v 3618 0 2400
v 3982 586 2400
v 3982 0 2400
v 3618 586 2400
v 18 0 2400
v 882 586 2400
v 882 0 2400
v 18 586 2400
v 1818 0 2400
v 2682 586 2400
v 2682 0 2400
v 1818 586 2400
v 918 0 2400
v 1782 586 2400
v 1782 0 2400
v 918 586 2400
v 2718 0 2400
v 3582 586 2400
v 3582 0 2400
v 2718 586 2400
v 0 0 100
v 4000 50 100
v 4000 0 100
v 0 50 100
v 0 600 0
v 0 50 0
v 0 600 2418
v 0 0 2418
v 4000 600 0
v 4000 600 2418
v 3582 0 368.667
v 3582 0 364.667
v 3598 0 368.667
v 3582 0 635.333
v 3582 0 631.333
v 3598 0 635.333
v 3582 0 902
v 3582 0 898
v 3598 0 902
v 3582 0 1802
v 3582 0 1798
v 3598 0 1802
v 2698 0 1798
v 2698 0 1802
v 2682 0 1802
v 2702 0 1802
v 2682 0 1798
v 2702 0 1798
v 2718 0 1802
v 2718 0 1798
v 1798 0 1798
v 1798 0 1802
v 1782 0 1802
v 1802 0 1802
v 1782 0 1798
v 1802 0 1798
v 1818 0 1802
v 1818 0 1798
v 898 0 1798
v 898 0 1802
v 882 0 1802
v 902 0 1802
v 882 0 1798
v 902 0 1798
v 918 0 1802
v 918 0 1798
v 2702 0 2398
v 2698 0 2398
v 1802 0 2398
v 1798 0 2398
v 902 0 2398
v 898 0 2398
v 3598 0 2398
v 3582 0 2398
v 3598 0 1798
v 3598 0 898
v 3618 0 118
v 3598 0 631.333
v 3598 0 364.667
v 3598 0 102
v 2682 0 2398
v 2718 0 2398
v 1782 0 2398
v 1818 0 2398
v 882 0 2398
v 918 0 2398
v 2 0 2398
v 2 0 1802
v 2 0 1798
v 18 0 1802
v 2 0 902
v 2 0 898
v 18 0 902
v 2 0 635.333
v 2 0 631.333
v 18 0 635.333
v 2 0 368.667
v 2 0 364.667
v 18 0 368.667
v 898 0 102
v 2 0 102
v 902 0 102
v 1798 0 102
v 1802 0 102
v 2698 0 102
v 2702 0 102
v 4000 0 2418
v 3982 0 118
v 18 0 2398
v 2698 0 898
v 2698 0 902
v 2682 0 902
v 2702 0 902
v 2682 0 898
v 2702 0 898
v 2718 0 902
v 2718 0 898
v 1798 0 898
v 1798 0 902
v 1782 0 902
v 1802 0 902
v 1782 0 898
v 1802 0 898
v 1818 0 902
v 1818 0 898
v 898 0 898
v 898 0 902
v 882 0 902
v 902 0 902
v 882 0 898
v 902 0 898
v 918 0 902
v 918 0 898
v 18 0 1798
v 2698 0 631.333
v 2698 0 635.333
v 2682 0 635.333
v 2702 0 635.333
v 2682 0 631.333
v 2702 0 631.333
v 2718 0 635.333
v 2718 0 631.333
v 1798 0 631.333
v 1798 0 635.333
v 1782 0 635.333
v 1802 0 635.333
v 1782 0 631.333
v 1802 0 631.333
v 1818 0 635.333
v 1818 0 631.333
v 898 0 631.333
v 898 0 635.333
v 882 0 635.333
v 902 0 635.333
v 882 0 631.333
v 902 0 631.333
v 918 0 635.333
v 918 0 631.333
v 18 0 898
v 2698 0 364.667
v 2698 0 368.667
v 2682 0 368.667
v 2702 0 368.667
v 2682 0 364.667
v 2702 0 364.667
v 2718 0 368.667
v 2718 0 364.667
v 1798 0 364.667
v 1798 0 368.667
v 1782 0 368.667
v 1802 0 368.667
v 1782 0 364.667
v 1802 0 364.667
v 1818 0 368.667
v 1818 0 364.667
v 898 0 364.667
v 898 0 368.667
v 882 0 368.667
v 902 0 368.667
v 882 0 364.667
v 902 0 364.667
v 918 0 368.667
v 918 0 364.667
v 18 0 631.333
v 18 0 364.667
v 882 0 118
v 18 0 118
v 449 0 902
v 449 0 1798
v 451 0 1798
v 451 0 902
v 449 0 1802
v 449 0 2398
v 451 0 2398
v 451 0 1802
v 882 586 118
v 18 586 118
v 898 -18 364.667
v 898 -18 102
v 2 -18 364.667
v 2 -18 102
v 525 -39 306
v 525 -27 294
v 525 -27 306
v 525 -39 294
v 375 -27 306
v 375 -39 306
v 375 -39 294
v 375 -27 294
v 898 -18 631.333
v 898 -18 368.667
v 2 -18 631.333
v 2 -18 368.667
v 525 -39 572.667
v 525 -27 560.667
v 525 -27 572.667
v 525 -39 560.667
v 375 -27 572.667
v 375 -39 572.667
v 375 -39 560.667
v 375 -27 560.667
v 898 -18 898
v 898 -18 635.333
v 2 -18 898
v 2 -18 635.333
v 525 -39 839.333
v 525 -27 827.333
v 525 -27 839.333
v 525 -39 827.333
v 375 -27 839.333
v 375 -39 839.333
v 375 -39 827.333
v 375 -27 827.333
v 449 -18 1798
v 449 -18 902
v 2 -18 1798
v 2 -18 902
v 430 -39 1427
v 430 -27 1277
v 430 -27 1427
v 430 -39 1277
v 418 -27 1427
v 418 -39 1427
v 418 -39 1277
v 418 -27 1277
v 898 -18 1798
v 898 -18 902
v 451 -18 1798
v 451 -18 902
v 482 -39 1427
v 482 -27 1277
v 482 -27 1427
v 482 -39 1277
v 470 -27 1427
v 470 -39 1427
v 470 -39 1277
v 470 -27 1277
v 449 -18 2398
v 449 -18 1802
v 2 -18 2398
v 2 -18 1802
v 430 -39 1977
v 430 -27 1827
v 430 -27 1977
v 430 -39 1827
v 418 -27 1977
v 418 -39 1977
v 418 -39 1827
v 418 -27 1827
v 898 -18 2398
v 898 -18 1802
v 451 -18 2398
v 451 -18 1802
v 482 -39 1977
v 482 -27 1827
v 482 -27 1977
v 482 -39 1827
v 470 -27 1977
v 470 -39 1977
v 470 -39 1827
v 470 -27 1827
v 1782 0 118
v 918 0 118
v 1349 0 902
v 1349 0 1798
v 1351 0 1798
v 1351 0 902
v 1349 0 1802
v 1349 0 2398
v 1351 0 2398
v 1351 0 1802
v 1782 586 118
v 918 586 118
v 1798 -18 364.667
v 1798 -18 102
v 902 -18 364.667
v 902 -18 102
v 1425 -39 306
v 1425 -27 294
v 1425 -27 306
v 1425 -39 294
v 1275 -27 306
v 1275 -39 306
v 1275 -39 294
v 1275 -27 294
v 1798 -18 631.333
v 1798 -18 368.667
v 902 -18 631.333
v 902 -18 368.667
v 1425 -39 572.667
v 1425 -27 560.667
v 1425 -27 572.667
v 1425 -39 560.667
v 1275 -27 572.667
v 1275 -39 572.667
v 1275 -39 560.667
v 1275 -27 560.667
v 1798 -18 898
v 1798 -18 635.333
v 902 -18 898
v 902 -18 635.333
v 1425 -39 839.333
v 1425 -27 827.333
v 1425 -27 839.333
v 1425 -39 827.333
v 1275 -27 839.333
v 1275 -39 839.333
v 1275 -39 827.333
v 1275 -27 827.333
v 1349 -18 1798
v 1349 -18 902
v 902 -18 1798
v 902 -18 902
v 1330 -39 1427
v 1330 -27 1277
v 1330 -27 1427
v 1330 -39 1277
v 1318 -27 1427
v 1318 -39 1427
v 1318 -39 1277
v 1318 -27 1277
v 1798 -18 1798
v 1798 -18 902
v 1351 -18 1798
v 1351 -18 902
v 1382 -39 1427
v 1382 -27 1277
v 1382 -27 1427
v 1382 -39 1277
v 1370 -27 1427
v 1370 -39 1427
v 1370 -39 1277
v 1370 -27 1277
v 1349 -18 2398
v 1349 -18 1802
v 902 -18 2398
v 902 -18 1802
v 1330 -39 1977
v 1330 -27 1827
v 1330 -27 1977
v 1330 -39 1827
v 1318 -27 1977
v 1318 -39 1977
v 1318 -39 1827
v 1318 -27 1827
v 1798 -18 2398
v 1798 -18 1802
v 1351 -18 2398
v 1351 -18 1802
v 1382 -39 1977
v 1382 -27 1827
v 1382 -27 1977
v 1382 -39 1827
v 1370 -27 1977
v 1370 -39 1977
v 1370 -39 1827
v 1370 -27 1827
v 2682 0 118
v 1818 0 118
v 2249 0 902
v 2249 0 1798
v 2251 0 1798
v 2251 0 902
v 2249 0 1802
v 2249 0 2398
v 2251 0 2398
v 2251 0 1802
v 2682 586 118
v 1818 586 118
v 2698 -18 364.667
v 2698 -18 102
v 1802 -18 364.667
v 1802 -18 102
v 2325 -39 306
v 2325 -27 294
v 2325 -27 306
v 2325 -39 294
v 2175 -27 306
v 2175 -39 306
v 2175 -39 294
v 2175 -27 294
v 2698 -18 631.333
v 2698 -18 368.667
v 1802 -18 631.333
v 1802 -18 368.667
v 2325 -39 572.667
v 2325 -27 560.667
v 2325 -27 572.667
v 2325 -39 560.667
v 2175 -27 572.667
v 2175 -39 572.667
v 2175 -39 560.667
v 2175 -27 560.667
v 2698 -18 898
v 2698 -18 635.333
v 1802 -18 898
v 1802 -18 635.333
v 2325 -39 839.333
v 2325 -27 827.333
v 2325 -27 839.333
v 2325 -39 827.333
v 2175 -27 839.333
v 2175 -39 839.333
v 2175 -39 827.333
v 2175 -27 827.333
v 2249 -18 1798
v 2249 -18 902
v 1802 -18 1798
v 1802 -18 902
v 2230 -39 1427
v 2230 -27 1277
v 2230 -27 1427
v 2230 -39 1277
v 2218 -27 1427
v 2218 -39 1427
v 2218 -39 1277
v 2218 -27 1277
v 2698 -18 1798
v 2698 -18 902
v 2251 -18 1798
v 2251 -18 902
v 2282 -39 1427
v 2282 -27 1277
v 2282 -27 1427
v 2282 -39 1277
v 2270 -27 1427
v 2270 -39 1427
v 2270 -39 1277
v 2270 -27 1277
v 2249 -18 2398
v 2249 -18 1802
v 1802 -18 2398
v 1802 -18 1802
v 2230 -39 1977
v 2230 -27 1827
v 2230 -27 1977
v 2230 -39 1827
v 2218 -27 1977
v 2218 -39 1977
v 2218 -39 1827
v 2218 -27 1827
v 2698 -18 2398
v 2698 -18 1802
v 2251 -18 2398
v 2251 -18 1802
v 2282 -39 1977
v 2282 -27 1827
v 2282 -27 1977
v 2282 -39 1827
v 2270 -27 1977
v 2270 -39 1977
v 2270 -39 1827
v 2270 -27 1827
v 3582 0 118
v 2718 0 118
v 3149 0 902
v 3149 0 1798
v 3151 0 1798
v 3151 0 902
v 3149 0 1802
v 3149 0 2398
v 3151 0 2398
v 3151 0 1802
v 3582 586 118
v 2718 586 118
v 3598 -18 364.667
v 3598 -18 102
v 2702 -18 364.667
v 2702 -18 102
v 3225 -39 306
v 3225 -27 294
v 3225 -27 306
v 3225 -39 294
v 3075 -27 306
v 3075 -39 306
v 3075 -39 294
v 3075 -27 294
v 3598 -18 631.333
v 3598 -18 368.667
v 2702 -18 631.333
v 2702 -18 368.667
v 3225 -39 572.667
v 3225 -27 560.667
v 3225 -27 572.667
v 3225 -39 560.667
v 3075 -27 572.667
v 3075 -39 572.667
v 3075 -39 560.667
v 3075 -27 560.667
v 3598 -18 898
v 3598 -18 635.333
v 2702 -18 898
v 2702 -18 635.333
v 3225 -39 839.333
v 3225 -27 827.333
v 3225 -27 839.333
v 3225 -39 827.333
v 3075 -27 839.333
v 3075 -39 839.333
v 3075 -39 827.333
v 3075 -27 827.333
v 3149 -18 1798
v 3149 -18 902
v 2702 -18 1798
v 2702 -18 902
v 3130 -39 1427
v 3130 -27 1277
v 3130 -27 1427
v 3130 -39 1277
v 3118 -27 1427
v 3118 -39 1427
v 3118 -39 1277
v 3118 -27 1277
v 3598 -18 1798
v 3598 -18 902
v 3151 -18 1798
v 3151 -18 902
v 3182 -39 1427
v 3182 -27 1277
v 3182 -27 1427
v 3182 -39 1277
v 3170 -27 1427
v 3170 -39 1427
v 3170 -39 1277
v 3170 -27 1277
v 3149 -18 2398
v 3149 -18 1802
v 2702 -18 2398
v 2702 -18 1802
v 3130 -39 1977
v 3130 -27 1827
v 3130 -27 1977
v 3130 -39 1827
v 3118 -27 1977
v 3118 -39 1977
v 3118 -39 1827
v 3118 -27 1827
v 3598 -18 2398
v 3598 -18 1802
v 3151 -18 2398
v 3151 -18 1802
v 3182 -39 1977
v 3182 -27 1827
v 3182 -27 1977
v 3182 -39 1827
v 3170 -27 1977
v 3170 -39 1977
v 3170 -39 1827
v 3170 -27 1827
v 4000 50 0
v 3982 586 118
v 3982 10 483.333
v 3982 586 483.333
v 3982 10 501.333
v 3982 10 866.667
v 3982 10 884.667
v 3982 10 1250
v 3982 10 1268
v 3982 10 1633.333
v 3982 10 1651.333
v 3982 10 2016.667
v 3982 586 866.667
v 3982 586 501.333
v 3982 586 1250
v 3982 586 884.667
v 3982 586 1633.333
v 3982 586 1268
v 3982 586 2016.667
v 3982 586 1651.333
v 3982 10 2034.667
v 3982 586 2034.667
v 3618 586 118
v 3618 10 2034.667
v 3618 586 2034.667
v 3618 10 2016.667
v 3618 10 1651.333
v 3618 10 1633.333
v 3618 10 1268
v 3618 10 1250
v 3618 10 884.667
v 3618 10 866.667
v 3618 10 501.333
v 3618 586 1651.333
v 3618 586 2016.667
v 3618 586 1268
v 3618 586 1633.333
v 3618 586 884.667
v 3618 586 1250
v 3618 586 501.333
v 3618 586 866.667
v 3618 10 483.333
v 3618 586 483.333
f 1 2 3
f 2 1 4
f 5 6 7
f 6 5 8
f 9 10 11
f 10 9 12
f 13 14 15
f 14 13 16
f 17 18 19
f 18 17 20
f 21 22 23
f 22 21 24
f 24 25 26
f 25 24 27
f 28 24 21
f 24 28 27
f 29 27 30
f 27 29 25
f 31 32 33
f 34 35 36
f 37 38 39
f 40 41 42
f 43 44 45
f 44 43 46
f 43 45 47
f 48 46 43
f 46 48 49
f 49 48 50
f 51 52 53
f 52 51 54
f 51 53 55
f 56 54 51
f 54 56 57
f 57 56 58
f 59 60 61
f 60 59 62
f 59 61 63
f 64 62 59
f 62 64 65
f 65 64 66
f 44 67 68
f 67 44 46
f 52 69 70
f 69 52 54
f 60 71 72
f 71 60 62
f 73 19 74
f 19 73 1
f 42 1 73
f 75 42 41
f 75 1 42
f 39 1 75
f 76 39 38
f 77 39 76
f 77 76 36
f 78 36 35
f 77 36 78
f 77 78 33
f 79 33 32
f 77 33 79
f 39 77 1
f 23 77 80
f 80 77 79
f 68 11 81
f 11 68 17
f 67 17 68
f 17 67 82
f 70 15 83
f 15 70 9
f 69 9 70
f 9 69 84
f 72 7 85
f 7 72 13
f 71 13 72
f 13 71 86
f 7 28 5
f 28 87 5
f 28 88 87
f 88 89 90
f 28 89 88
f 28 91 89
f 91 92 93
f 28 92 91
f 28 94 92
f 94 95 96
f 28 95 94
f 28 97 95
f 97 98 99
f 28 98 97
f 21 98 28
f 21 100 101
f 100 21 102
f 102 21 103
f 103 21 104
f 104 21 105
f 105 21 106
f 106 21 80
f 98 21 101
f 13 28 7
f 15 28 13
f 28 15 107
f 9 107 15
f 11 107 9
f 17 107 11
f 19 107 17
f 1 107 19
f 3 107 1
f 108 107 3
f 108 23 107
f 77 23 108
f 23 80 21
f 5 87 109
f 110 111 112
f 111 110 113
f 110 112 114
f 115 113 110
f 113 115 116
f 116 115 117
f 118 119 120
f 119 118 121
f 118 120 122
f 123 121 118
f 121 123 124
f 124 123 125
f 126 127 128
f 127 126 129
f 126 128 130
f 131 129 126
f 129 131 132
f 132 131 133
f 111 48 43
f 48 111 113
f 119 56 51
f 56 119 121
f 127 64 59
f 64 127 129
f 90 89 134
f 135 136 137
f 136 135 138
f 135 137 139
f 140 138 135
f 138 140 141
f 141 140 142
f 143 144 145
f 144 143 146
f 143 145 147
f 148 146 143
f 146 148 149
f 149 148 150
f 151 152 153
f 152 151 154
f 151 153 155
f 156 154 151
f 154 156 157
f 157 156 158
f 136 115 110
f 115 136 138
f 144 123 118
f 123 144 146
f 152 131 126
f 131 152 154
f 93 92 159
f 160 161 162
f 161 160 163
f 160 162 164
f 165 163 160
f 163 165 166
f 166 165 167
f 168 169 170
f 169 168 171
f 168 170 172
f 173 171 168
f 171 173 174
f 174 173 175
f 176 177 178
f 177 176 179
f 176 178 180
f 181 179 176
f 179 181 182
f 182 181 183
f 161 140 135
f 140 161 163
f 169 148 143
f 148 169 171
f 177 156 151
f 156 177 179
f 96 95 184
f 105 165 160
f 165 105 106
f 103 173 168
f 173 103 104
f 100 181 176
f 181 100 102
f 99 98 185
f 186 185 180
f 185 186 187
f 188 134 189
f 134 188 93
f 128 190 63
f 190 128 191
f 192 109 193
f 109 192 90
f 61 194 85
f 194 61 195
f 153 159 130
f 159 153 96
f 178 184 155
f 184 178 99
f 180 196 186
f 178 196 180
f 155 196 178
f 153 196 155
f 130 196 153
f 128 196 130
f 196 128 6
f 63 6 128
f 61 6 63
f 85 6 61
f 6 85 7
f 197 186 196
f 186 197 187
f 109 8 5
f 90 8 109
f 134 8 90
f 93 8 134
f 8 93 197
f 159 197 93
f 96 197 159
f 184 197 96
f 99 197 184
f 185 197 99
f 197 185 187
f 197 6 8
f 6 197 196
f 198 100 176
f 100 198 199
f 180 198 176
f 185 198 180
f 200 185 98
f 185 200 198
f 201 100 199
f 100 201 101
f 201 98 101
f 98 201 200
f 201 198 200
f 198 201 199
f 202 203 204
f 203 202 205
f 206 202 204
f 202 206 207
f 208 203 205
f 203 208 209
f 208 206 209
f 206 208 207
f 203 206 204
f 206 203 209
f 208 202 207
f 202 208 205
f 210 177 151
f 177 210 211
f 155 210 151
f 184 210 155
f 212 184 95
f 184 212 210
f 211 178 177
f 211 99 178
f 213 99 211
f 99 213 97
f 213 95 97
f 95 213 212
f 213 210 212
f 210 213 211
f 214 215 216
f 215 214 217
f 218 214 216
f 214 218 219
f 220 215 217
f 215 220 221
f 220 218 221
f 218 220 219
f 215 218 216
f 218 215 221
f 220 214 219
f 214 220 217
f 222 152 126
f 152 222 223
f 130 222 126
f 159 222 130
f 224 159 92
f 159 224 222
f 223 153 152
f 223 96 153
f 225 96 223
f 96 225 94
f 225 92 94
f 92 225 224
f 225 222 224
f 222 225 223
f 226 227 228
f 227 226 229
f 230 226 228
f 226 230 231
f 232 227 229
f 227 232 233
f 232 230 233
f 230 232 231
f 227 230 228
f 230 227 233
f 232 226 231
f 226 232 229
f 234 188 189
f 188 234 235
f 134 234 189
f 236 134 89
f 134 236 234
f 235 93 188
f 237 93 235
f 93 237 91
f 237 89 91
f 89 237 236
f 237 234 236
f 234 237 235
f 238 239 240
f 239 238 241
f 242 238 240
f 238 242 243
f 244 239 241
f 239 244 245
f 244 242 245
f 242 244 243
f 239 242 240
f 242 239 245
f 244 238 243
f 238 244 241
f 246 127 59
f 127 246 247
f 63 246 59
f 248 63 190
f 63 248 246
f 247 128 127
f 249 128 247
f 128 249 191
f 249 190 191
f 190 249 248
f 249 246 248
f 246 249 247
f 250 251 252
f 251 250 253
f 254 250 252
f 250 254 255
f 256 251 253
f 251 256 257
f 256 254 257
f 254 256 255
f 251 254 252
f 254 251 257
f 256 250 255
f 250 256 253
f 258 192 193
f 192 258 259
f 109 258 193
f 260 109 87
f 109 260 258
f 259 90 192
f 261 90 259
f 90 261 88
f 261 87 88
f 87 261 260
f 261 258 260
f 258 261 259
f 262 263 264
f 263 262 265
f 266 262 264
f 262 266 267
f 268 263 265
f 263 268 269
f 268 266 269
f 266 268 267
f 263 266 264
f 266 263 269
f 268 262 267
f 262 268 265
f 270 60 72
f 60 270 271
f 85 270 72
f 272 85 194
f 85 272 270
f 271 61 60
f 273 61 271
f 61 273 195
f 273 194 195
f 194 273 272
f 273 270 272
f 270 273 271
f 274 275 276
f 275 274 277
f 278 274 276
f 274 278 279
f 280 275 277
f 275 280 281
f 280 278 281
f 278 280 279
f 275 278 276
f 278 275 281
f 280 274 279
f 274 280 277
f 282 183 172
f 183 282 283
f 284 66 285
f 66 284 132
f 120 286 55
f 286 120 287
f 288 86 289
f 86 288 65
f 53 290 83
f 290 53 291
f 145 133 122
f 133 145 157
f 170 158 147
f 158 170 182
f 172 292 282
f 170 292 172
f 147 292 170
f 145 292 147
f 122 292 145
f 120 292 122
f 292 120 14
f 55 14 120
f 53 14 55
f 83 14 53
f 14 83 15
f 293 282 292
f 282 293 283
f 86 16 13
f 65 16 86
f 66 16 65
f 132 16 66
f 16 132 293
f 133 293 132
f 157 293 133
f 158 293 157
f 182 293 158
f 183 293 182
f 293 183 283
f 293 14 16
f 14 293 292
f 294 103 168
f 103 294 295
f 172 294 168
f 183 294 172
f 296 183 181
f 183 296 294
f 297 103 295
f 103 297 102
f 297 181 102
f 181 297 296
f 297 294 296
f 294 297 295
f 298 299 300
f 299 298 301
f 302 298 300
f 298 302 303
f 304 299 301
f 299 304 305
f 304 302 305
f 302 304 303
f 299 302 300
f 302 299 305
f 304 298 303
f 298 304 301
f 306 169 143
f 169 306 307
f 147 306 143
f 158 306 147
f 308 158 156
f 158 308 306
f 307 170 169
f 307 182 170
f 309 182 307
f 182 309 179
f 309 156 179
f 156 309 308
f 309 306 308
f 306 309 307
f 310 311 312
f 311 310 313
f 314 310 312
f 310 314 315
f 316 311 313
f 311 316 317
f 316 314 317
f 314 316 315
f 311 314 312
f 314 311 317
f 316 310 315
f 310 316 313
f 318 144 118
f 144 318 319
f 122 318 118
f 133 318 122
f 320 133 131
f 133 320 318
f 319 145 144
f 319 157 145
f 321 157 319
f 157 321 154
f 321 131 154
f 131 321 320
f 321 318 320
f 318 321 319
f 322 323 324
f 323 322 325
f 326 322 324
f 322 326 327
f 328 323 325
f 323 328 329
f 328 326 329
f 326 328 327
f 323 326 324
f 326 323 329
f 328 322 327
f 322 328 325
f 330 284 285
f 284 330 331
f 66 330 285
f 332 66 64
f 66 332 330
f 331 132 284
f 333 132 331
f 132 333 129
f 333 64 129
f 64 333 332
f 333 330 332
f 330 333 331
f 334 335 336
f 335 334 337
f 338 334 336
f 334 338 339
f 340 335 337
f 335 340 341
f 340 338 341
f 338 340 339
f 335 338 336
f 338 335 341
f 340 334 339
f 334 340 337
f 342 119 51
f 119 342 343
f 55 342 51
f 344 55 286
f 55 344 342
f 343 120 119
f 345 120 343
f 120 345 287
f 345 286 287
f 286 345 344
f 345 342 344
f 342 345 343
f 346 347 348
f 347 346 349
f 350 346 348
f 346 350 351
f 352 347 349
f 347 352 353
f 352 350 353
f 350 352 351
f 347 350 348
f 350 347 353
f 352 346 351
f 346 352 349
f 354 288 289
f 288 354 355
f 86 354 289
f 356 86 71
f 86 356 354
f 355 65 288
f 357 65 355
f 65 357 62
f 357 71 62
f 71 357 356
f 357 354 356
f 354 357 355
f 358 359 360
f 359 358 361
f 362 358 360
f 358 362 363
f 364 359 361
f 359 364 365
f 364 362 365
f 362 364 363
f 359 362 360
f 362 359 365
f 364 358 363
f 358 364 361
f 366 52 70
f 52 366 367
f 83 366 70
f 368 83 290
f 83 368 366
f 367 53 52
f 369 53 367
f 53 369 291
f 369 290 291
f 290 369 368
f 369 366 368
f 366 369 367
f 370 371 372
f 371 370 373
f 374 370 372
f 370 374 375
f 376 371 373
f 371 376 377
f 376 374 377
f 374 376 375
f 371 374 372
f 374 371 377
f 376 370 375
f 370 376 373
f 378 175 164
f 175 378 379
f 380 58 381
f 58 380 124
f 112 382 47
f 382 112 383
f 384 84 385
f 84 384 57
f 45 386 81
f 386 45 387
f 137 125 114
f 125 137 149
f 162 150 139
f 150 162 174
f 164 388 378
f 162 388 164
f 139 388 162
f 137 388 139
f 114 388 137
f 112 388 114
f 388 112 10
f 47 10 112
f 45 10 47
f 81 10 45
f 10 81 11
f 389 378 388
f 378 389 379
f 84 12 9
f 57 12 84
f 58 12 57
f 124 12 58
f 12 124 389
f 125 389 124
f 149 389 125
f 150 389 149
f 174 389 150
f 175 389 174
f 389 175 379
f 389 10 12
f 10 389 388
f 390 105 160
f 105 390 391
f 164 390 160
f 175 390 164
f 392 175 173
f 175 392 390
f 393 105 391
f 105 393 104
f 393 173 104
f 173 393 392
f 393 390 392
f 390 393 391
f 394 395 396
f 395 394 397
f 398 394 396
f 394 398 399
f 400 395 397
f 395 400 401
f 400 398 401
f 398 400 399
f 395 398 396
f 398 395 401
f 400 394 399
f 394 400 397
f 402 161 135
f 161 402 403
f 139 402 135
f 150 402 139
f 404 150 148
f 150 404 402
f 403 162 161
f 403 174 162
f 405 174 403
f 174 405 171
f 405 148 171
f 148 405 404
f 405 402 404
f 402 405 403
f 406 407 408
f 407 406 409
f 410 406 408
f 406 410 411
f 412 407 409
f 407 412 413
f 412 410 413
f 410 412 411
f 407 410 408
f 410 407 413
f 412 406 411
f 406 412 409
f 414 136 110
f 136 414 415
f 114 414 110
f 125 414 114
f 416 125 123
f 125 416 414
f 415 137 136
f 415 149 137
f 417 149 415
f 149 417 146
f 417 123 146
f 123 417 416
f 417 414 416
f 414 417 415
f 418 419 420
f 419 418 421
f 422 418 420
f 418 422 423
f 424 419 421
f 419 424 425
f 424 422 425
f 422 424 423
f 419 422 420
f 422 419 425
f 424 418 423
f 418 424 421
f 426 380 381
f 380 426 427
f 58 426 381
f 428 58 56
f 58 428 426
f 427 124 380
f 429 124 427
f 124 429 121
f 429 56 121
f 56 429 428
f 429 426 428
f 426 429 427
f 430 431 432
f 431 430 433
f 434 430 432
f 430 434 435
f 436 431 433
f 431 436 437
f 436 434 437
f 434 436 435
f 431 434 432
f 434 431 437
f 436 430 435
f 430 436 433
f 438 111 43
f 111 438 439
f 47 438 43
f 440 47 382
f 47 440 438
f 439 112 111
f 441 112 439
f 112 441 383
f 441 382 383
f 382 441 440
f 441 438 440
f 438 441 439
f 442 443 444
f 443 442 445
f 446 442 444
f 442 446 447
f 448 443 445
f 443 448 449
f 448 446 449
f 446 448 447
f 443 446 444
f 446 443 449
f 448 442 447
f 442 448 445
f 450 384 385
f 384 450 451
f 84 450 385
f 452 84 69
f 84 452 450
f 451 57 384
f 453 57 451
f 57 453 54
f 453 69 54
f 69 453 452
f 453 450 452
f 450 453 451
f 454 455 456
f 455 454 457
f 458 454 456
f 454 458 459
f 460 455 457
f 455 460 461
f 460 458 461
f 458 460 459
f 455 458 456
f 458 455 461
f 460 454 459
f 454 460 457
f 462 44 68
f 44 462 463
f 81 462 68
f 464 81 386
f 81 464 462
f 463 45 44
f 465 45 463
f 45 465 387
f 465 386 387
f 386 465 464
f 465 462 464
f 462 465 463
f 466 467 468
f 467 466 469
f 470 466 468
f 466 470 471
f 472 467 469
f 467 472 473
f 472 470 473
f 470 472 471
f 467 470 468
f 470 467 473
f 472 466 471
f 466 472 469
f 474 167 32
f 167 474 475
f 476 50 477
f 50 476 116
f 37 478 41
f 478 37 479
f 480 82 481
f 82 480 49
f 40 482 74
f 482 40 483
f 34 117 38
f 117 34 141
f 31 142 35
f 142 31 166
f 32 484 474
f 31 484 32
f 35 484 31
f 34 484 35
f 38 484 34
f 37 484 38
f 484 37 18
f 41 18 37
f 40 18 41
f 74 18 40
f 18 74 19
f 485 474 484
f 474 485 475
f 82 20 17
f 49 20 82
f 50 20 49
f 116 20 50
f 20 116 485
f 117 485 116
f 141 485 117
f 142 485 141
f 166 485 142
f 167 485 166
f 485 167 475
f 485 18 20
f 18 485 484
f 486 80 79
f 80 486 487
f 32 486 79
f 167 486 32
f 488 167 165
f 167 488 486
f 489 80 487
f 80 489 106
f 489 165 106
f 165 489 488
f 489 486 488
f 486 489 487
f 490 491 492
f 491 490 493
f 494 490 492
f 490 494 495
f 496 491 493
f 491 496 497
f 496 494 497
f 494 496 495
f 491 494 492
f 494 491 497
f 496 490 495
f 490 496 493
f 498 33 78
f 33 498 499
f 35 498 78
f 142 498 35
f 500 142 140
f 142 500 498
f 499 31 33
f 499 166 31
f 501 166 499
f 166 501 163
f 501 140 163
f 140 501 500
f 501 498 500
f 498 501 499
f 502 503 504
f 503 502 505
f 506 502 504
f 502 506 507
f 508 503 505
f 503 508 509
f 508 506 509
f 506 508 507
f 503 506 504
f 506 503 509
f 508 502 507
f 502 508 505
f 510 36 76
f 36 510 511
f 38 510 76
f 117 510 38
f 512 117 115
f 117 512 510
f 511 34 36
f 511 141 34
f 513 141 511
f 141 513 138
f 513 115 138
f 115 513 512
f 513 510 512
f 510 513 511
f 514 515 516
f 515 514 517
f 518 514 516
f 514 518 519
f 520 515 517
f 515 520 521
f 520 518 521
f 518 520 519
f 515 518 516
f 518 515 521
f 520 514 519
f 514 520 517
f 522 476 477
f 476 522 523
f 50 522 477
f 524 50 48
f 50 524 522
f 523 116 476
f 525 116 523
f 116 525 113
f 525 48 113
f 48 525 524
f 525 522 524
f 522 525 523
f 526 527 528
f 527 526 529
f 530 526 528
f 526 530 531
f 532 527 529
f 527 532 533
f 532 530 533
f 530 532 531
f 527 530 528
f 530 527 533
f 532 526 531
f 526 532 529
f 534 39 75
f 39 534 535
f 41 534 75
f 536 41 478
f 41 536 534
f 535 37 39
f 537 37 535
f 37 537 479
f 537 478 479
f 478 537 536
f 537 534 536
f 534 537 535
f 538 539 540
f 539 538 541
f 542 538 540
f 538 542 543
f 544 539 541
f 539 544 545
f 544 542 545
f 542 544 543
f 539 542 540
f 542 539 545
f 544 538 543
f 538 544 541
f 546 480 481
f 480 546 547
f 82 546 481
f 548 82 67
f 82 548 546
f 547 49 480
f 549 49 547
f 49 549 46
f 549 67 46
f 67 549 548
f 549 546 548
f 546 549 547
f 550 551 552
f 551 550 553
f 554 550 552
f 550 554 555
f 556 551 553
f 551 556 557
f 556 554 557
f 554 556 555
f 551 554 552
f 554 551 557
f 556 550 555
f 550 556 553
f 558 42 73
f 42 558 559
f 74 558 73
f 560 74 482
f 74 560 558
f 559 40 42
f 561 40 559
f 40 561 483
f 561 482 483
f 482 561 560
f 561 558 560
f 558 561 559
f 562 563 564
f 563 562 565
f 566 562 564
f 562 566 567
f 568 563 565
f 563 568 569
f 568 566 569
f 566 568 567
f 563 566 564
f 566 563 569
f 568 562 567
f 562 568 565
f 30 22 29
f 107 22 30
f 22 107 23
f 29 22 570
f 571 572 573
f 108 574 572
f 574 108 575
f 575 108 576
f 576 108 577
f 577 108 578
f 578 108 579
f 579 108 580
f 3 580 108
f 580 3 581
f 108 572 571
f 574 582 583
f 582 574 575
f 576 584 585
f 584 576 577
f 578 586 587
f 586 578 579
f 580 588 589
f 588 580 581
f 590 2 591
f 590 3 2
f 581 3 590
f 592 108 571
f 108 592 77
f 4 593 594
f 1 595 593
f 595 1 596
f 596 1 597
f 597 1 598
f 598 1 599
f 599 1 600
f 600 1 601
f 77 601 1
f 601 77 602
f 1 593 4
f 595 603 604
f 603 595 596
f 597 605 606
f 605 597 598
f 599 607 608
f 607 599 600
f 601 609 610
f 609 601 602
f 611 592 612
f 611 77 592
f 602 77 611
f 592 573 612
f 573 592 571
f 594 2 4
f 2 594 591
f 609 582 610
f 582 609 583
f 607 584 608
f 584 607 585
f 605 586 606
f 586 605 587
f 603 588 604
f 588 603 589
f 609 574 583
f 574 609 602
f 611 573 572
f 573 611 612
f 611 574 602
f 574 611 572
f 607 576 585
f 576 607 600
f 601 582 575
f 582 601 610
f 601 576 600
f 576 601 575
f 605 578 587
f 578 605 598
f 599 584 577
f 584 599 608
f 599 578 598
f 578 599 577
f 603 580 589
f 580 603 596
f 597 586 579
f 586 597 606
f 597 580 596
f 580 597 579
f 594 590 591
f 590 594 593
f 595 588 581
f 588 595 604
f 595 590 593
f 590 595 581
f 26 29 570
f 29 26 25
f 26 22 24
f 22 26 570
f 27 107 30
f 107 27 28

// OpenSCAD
// =========================================================================
// PROJECT: ADAPTIVE PARAMETRIC WARDROBE SYSTEM
// ARCHITECT: Timothy Okibe Ogese
// FEATURES: Auto-Scaling, Unified Top Panel, Ergonomic Hardware
// =========================================================================

// --- 1. USER INPUTS (The "Dashboard") ---
room_width            = 4000;   // Total available space
target_module_width   = 900;    // Desired width per wardrobe unit
handle_style          = "bar";  // "bar" or "knob"

// --- 2. SYSTEM CONSTANTS ---
total_height      = 2400;
depth             = 600;
thickness         = 18;         
plinth_h          = 100;        
drawer_zone_h     = 800;        
upper_zone_h      = 600;        
gap               = 2;          

// --- 3. HARDWARE MODULE (Refined Logic) ---
module handle_bar(len=150, thick=12, orientation="vertical") {
    color([0.7, 0.5, 0.2]) { // Metallic Gold
        if (orientation == "horizontal") {
            cube([len, thick, thick], center=true);
        } else { 
            cube([thick, thick, len], center=true);
        }
    }
}

// --- 4. SUB-ASSEMBLY MODULES ---
module carcass(w) {
    color([0.8, 0.7, 0.6]) {
        difference() {
            cube([w, depth, total_height - plinth_h]);
            translate([thickness, -1, thickness])
                cube([w - thickness*2, depth - thickness + 5, total_height]);
        }
    }
}

module door_pair(w, h, z_offset, handle_pos="center") {
    color([0.95, 0.95, 0.95], 0.9) {
        door_w = (w/2) - (gap*1.5);
        // UX Logic: Upper units get low handles for reachability
        h_z = (handle_pos == "low") ? 100 : h/2;

        translate([gap, -thickness, z_offset + gap]) {
            cube([door_w, thickness, h - gap*2]);
            translate([door_w - 25, -15, h_z]) handle_bar(150, 12, "vertical");
        }
        translate([door_w + gap*2, -thickness, z_offset + gap]) {
            cube([door_w, thickness, h - gap*2]);
            translate([25, -15, h_z]) handle_bar(150, 12, "vertical");
        }
    }
}

module smart_unit(w, type="wardrobe") {
    carcass(w);
    if (type == "wardrobe") {
        for(d = [0:2]) { // Drawer Logic
            d_h = drawer_zone_h / 3;
            translate([gap, -thickness, (d * d_h) + gap])
                color("white") cube([w - gap*2, thickness, d_h - gap*2]);
            // Horizontal Drawer Handles
            translate([w/2, -thickness - 15, (d * d_h) + d_h * 0.75]) 
                handle_bar(150, 12, "horizontal");
        }
        mid_door_h = total_height - plinth_h - drawer_zone_h - upper_zone_h;
        door_pair(w, mid_door_h, drawer_zone_h, "center");
        door_pair(w, upper_zone_h, total_height - plinth_h - upper_zone_h, "low"); 
    } else { // Shelf Logic
        for(s = [1:5]) {
            translate([thickness, 10, s * ((total_height-plinth_h)/6)]) 
                color("white") cube([w-thickness*2, depth-20, thickness]);
        }
    }
}

// --- 5. THE ENGINE & FINAL ASSEMBLY ---
num_main_units = max(1, floor(room_width / target_module_width));
leftover       = room_width % target_module_width;
has_shelf      = (leftover >= 300) ? 1 : 0;
actual_w       = has_shelf ? target_module_width : (room_width / num_main_units);

translate([0, 0, plinth_h]) {
    // Plinth & Top Panel
    color([0.2, 0.2, 0.2]) translate([0, 50, -plinth_h]) cube([room_width, depth-50, plinth_h]);
    color([0.8, 0.7, 0.6]) translate([0, 0, total_height - plinth_h]) cube([room_width, depth, thickness]);

    for (i = [0 : num_main_units - 1]) {
        translate([i * actual_w, 0, 0]) smart_unit(actual_w, "wardrobe");
    }
    if (has_shelf) {
        translate([num_main_units * actual_w, 0, 0]) smart_unit(leftover, "shelves");
    }
}
